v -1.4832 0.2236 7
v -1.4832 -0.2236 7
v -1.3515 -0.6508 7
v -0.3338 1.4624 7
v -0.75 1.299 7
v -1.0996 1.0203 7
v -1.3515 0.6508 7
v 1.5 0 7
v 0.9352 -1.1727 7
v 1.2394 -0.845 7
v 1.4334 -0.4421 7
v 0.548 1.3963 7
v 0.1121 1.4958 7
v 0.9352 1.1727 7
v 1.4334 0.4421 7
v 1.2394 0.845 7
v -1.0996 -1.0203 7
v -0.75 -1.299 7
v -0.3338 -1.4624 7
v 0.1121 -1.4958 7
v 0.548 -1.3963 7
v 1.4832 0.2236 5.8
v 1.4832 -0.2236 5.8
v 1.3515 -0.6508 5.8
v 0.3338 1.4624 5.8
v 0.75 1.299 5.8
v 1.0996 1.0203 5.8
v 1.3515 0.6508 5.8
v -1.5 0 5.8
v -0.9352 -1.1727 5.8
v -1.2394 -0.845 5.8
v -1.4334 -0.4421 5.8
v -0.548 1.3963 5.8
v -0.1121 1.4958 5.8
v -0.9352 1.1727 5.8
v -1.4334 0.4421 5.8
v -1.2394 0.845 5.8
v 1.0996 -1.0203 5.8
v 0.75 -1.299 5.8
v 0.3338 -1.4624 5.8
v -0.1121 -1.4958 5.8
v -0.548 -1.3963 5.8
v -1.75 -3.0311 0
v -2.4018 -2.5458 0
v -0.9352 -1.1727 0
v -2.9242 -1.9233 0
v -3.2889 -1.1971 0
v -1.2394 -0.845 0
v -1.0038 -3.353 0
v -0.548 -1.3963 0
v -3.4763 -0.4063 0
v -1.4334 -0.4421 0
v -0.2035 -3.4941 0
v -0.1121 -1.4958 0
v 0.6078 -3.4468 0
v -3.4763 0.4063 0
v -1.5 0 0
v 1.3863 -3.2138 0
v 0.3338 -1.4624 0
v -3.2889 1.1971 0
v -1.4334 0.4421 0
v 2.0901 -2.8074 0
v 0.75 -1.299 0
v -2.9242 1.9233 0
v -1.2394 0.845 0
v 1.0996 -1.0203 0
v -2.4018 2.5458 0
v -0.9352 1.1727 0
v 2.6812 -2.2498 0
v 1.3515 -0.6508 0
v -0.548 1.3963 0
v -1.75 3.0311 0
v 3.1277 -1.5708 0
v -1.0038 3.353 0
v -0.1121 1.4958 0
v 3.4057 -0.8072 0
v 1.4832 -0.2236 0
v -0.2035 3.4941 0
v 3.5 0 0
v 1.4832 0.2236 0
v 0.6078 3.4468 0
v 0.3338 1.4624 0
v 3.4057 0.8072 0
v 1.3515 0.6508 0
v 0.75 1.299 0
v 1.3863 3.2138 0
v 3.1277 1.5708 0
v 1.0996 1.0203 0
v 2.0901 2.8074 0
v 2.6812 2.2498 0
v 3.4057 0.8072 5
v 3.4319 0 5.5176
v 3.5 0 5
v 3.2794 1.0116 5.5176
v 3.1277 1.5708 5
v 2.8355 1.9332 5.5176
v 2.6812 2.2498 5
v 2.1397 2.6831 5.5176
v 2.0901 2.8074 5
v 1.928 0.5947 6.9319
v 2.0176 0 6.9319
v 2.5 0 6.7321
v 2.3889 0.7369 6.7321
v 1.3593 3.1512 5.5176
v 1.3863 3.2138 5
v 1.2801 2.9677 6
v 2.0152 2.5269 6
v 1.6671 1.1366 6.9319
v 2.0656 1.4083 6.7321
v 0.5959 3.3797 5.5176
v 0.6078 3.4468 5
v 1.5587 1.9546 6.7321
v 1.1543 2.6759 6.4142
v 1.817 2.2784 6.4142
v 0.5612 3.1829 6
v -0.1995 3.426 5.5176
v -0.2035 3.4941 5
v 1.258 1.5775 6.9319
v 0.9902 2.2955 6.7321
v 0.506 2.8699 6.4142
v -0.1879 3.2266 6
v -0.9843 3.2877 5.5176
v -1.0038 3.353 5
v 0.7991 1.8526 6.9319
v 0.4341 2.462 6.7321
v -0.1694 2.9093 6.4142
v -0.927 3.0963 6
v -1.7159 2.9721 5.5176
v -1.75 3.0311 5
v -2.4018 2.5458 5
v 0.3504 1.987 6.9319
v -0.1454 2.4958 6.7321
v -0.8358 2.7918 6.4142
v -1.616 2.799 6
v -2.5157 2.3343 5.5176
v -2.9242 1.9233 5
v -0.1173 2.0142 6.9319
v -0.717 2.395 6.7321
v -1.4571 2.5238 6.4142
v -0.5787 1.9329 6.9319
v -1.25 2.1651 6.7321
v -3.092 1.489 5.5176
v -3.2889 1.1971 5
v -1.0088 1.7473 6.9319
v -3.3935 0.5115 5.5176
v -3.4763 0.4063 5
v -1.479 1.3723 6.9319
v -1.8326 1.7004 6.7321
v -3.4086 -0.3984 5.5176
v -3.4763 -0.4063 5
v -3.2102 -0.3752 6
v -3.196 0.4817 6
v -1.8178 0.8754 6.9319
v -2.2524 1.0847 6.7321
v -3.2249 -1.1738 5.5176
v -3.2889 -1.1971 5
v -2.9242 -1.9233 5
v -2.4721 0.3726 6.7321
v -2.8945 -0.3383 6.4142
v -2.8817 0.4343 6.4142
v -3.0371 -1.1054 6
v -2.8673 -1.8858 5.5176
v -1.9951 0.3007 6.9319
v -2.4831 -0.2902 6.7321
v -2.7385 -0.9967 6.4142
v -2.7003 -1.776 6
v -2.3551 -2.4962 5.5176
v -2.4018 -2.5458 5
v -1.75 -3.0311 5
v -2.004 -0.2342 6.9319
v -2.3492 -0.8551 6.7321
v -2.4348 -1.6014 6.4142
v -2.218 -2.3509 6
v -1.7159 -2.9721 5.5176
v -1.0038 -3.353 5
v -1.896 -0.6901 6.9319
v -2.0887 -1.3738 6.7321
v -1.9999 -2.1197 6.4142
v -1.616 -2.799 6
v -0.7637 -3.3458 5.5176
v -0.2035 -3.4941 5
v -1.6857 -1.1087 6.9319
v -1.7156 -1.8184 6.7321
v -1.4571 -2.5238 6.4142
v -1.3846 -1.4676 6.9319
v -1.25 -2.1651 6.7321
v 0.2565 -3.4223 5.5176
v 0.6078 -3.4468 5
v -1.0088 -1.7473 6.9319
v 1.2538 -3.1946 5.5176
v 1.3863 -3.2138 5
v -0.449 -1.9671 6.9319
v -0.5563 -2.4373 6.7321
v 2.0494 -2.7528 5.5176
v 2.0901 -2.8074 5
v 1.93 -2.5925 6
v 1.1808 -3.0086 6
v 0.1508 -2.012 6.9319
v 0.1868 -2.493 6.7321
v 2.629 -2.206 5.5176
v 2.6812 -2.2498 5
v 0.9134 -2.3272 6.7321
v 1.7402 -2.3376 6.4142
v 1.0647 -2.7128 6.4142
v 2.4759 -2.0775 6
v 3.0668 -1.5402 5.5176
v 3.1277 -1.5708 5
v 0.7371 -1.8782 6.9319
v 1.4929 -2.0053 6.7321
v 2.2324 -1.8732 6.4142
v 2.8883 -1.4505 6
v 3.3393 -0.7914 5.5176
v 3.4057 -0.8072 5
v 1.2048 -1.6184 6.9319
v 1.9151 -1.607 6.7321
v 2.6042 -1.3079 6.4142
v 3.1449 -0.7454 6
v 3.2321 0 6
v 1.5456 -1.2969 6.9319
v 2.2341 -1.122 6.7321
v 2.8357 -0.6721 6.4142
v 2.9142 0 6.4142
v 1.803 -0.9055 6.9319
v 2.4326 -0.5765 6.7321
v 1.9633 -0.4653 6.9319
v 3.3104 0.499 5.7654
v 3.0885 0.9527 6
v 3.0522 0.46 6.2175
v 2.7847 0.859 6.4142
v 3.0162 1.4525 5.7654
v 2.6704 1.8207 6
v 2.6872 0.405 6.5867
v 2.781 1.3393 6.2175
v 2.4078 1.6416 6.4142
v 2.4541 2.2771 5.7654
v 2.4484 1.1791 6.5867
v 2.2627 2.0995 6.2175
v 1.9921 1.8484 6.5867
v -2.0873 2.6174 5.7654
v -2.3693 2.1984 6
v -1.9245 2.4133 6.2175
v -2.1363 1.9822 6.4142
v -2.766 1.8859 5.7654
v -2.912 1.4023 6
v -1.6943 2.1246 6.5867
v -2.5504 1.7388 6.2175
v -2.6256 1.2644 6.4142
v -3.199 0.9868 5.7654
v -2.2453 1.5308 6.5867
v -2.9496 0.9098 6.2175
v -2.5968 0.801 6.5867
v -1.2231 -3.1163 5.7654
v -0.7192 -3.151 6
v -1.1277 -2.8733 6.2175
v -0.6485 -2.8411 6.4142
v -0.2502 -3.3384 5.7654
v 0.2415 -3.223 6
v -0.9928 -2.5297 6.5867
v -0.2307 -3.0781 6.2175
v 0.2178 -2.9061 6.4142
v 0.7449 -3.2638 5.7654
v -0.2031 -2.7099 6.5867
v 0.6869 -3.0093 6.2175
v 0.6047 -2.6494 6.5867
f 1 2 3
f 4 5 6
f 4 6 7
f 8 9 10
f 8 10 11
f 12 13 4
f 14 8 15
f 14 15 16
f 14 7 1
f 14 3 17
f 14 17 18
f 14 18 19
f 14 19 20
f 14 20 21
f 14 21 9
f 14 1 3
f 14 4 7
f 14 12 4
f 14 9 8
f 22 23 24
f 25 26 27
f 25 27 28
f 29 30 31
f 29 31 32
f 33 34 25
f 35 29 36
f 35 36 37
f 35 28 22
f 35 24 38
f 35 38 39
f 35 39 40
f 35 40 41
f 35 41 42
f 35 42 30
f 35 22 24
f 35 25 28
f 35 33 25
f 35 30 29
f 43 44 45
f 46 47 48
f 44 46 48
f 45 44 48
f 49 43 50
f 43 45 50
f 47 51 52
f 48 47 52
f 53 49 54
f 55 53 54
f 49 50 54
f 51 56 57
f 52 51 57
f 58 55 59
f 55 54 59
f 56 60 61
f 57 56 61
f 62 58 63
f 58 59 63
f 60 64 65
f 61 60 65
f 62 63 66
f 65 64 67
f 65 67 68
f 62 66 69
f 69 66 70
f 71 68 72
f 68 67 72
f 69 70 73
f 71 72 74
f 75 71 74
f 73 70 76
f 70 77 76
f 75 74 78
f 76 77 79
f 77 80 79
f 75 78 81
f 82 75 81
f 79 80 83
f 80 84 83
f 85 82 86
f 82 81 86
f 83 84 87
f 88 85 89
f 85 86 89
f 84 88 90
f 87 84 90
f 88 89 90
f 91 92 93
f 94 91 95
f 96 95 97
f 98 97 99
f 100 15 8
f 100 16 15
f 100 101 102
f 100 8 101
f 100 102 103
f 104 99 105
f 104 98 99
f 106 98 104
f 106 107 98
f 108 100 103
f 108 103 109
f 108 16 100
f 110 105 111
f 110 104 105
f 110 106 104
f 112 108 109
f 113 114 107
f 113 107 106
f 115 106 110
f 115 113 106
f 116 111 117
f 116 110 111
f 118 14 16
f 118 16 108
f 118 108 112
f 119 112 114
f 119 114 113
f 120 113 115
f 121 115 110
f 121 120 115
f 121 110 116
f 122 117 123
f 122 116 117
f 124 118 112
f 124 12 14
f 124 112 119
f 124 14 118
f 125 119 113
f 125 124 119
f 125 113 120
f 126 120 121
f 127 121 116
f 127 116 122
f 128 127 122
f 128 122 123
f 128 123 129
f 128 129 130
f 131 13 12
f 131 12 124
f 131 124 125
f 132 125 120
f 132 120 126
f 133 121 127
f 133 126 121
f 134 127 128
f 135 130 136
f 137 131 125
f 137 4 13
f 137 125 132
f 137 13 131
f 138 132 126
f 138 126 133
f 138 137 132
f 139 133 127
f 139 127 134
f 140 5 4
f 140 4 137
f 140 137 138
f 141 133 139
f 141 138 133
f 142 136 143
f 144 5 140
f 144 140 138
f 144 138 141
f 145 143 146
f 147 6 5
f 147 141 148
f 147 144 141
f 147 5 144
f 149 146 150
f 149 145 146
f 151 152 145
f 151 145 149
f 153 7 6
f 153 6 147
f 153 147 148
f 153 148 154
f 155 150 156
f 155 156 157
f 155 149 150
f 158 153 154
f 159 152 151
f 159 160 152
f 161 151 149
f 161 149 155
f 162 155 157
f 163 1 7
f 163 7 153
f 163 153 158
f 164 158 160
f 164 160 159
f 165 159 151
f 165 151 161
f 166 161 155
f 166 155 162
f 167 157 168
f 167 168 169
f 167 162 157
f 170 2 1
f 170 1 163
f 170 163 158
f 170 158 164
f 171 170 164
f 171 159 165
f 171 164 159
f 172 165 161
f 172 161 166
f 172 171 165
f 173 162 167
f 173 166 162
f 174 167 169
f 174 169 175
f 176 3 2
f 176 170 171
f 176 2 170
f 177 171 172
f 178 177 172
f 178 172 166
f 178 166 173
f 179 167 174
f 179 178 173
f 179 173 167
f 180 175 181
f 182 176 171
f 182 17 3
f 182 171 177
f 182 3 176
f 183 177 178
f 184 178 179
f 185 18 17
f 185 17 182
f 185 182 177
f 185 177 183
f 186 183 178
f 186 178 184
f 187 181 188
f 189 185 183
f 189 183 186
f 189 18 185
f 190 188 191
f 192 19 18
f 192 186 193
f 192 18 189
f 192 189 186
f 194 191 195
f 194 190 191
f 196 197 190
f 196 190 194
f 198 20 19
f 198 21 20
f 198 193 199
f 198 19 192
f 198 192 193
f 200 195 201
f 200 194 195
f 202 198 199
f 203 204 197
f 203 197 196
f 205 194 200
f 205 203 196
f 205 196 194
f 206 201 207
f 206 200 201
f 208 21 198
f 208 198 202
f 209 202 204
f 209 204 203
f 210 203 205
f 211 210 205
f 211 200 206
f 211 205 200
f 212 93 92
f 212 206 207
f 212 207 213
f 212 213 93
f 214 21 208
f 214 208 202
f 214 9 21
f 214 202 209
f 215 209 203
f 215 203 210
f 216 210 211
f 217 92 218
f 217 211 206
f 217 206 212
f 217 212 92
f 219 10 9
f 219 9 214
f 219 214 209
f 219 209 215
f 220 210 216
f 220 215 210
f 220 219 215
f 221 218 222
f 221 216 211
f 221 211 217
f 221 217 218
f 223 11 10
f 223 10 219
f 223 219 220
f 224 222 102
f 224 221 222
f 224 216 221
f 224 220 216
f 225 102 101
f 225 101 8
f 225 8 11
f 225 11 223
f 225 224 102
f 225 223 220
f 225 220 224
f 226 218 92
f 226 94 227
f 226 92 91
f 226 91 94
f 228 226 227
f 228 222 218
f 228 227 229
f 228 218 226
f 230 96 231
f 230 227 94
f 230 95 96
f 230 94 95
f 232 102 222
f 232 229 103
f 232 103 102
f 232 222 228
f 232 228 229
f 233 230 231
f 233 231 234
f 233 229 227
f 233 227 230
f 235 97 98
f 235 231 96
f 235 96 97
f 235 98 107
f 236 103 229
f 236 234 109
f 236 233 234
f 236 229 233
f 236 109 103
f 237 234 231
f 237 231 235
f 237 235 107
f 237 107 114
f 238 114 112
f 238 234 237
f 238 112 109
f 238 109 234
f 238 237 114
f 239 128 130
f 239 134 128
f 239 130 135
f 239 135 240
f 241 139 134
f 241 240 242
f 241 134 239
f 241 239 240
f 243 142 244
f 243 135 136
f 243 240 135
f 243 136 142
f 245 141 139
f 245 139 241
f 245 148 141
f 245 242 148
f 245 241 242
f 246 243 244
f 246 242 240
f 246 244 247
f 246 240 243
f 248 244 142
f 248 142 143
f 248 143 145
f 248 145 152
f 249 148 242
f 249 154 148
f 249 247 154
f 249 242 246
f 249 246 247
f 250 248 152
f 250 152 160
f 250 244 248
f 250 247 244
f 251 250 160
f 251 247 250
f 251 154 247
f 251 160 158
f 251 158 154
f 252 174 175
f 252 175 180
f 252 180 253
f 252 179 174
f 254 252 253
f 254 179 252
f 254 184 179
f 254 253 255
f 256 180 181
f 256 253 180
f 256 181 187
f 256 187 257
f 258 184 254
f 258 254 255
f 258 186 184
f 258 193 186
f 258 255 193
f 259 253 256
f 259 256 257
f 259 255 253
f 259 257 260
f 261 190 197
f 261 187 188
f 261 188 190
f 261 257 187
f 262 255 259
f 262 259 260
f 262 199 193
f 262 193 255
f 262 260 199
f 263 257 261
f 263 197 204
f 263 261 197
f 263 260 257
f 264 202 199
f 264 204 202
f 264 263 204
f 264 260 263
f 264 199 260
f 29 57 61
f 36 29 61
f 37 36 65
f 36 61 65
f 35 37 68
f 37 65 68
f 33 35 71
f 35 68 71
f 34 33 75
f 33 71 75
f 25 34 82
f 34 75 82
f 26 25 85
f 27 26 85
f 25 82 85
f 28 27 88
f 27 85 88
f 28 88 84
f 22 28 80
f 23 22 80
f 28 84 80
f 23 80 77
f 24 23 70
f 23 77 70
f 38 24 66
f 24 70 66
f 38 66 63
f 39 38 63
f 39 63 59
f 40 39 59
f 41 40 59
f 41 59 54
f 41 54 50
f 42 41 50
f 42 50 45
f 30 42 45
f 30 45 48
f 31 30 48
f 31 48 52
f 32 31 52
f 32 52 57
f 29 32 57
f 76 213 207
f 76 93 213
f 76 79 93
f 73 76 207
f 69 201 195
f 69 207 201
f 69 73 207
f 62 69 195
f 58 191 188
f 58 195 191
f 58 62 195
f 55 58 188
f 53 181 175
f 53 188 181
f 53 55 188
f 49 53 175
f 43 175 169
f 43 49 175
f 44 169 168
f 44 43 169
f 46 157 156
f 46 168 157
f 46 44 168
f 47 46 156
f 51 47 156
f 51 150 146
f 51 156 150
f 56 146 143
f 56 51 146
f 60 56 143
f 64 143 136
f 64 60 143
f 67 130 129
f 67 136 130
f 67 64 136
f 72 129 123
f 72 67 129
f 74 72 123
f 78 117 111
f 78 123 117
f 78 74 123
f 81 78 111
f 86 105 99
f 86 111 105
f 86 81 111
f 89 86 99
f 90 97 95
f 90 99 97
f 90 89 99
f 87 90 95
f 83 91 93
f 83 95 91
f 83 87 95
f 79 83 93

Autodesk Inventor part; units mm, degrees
ref_plane "YZ Plane" through (0, 0, 0) normal (1, 0, 0) x (0, 1, 0)
ref_plane "XZ Plane" through (0, 0, 0) normal (0, 1, 0) x (-1, 0, 0)
ref_plane "XY Plane" through (0, 0, 0) normal (0, 0, 1) x (1, 0, 0)
sketch "Эскиз1" plane through (0, 0, 0) normal (0, 0, 1) x (1, 0, 0)
  circle A0 centre (0, 0) radius 3.5
  dimension "d0" = 7
extrude "Выдавливание1" add sketch "Эскиз1" along normal blind 7
fillet "Сопряжение1" radius 2 1 edges at (-3.5, 0, 7)
sketch "Эскиз2" plane through (0, 0, 0) normal (0, 0, -1) x (-1, 0, 0)
  circle A0 centre (0, 0) radius 1.5 projected
  circle A1 centre (0, 0) radius 1.5
  dimension "d4" = 3
extrude "Выдавливание2" cut sketch "Эскиз2" against normal blind 5.8
properties part number "back_pimp"
